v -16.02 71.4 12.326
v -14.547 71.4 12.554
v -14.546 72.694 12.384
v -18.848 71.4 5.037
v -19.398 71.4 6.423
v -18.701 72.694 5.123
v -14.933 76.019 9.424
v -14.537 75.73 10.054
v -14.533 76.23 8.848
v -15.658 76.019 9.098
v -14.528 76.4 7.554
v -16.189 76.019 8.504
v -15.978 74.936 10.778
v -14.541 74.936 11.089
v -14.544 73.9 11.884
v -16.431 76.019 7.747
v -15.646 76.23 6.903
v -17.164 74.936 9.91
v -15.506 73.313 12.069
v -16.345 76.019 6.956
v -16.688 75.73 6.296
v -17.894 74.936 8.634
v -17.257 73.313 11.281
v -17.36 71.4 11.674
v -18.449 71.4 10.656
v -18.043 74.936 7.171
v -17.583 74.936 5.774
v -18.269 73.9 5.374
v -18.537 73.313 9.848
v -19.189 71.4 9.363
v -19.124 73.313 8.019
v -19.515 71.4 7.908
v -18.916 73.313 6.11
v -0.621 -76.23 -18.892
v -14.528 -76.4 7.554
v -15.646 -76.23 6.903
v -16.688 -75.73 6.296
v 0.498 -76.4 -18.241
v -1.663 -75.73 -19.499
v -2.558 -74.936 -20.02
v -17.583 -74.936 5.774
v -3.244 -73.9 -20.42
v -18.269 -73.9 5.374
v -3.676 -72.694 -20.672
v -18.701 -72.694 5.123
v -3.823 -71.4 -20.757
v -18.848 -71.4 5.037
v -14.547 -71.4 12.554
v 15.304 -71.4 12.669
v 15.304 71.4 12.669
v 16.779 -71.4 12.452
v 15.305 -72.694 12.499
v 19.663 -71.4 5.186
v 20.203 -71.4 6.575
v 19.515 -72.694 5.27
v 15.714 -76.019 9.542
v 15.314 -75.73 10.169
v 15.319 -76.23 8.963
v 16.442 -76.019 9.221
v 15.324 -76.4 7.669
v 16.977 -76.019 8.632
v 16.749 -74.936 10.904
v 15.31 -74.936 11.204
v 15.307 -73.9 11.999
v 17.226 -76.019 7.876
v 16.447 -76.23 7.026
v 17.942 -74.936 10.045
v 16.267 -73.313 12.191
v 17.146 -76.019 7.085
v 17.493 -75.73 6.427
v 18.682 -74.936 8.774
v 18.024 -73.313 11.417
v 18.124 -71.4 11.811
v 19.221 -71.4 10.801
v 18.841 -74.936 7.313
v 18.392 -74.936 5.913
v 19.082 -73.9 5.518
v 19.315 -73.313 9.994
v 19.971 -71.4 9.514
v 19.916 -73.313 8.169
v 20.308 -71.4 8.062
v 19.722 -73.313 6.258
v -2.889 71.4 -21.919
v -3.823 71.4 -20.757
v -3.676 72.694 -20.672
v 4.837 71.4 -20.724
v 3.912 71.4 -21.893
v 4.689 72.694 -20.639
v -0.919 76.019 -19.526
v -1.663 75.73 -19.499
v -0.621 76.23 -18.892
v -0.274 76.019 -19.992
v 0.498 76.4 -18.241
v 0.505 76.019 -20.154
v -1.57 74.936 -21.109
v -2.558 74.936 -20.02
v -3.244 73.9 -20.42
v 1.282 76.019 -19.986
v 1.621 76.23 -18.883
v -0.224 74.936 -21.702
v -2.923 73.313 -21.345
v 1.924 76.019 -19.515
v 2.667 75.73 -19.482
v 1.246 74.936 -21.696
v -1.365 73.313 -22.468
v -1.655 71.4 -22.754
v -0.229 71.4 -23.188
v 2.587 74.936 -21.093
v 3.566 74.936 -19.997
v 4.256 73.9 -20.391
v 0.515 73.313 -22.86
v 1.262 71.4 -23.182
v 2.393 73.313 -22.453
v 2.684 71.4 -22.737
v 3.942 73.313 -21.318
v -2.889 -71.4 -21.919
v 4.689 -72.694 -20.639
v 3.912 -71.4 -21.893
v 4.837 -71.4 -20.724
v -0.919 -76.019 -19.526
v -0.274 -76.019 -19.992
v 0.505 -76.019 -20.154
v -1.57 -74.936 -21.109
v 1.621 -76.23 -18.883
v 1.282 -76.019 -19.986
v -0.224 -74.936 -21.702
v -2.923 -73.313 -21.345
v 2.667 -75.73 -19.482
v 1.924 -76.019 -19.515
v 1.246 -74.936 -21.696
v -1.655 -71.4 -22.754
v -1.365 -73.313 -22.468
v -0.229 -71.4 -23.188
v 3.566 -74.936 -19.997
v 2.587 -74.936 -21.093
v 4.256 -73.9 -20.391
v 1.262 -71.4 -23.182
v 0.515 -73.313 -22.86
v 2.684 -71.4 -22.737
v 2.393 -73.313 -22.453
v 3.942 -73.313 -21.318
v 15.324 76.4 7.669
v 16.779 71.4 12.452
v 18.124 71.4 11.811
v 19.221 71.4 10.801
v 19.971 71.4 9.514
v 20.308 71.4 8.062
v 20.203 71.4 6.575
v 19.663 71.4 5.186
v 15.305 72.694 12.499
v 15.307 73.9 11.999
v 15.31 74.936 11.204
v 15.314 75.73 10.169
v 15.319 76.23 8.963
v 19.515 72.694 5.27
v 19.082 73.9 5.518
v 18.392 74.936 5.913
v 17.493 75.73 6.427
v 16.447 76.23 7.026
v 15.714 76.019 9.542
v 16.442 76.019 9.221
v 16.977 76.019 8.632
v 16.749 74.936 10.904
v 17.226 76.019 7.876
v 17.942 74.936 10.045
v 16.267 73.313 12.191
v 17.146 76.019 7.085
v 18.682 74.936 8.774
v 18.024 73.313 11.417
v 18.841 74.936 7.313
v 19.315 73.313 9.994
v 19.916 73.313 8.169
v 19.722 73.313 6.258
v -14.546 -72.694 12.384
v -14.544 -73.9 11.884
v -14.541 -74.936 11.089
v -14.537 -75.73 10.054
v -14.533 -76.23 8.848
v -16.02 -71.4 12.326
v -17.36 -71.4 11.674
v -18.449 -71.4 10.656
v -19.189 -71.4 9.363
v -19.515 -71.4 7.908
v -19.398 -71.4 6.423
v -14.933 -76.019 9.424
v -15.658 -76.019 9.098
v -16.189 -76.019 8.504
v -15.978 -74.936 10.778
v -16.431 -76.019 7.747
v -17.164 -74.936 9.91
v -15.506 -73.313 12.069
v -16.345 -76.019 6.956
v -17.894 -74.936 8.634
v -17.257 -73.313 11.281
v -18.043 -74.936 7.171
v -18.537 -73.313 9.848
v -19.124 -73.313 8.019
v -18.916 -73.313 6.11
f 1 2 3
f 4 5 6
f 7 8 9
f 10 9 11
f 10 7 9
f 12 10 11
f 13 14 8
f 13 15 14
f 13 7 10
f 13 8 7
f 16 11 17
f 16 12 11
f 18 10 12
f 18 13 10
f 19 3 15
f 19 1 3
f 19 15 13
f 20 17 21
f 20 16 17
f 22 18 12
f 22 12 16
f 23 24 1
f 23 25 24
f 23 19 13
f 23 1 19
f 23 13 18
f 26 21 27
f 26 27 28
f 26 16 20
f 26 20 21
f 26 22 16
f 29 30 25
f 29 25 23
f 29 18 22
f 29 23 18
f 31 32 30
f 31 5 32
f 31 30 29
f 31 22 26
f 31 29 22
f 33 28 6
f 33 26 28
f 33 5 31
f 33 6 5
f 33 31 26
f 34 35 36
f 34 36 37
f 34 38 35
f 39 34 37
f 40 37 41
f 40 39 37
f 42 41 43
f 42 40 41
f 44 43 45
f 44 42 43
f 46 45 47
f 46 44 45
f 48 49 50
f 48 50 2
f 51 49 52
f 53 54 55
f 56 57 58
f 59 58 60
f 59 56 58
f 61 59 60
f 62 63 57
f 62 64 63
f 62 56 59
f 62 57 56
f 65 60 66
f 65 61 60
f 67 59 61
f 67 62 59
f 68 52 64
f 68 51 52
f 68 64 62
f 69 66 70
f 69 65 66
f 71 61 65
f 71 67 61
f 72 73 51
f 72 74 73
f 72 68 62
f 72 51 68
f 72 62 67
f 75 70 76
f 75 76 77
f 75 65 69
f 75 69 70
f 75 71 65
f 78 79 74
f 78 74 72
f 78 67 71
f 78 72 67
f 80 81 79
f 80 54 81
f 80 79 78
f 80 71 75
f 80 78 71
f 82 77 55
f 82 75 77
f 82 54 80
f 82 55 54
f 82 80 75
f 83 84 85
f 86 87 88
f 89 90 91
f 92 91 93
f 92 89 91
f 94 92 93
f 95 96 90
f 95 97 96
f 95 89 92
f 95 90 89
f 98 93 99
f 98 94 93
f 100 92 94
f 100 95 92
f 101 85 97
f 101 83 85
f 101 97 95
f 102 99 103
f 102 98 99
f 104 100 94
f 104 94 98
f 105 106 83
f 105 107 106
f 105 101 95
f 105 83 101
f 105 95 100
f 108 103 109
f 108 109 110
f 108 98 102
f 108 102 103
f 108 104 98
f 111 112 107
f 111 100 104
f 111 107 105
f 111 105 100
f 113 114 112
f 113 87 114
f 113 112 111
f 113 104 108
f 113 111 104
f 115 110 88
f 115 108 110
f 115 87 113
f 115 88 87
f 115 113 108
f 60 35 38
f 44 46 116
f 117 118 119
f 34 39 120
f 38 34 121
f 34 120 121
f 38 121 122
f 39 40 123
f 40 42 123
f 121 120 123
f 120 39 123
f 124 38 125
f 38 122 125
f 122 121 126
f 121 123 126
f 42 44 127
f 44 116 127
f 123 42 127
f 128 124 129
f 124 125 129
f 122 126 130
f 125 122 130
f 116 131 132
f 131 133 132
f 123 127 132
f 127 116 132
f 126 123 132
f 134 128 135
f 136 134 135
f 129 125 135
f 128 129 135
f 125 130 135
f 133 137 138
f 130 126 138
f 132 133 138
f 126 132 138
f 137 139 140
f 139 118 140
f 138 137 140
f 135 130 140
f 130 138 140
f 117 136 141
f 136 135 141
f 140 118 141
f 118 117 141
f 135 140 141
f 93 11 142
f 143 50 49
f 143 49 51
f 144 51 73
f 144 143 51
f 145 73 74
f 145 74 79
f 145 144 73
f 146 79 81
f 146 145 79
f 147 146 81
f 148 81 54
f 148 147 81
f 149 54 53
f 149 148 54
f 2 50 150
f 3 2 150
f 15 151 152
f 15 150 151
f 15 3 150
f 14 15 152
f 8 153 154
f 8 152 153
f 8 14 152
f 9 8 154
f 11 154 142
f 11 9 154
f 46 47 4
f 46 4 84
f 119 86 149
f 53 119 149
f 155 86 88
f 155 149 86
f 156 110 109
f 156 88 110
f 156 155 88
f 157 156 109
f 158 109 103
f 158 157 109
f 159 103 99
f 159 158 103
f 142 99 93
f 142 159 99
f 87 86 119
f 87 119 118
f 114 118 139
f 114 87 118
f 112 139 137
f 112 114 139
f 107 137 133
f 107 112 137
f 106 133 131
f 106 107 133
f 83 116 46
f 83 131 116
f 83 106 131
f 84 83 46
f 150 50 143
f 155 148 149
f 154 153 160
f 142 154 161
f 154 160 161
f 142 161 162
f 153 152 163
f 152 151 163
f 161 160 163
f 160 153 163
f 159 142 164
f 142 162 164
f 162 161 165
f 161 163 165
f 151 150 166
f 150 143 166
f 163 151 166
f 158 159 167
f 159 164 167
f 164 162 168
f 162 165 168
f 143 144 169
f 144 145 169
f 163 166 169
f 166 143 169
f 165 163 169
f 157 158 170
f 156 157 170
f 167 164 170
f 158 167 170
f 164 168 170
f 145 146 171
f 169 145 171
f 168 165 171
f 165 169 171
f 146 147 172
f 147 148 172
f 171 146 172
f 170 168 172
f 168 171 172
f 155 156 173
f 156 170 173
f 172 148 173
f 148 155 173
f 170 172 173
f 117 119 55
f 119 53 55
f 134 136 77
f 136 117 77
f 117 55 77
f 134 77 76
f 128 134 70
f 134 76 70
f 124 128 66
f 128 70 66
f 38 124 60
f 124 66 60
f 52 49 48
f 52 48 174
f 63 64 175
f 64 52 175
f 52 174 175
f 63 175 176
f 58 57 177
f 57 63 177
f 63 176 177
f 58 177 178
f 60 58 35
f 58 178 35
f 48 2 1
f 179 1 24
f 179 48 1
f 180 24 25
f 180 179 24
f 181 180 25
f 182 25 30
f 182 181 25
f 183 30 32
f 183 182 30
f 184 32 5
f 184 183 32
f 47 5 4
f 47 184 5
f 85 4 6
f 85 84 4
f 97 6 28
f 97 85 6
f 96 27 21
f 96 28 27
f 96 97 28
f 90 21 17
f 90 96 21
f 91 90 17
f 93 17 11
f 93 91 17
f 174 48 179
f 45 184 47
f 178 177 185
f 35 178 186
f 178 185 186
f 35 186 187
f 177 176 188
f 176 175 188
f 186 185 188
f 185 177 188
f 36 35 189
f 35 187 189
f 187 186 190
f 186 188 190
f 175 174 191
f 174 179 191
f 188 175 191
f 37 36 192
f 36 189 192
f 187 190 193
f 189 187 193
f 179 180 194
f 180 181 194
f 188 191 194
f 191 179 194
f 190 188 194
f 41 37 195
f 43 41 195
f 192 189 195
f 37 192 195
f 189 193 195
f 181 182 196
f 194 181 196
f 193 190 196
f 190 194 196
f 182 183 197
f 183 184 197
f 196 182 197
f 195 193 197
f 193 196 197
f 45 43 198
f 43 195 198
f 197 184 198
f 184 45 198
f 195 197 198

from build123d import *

# Parameters (mm, degrees)
F1_DEPTH = 76.4
F2_R     = 5


with BuildPart() as f1:
    # F0 (on Front) → F1 (new body, symmetric)
    with BuildSketch(Plane.XZ):
        Polygon((23.964551, 12.702267), (-23.207255, 12.520527), (0.53604, -28.240586), align=None)
    extrude(amount=F1_DEPTH, both=True)

    # F2
    f2_edges = [f1.edges().sort_by_distance(p)[0] for p in [
        (0.378648, -76.4, 12.611397),
        (-11.335608, -76.4, -7.860029),
        (12.250295, -76.4, -7.769159),
        (0.378648, 76.4, 12.611397),
        (-11.335608, 76.4, -7.860029),
        (12.250295, 76.4, -7.769159),
        (-23.207255, 0, 12.520527),
        (0.53604, 0, -28.240586),
        (23.964551, 0, 12.702267),
    ]]
    fillet(f2_edges, radius=F2_R)


solid = f1.part
